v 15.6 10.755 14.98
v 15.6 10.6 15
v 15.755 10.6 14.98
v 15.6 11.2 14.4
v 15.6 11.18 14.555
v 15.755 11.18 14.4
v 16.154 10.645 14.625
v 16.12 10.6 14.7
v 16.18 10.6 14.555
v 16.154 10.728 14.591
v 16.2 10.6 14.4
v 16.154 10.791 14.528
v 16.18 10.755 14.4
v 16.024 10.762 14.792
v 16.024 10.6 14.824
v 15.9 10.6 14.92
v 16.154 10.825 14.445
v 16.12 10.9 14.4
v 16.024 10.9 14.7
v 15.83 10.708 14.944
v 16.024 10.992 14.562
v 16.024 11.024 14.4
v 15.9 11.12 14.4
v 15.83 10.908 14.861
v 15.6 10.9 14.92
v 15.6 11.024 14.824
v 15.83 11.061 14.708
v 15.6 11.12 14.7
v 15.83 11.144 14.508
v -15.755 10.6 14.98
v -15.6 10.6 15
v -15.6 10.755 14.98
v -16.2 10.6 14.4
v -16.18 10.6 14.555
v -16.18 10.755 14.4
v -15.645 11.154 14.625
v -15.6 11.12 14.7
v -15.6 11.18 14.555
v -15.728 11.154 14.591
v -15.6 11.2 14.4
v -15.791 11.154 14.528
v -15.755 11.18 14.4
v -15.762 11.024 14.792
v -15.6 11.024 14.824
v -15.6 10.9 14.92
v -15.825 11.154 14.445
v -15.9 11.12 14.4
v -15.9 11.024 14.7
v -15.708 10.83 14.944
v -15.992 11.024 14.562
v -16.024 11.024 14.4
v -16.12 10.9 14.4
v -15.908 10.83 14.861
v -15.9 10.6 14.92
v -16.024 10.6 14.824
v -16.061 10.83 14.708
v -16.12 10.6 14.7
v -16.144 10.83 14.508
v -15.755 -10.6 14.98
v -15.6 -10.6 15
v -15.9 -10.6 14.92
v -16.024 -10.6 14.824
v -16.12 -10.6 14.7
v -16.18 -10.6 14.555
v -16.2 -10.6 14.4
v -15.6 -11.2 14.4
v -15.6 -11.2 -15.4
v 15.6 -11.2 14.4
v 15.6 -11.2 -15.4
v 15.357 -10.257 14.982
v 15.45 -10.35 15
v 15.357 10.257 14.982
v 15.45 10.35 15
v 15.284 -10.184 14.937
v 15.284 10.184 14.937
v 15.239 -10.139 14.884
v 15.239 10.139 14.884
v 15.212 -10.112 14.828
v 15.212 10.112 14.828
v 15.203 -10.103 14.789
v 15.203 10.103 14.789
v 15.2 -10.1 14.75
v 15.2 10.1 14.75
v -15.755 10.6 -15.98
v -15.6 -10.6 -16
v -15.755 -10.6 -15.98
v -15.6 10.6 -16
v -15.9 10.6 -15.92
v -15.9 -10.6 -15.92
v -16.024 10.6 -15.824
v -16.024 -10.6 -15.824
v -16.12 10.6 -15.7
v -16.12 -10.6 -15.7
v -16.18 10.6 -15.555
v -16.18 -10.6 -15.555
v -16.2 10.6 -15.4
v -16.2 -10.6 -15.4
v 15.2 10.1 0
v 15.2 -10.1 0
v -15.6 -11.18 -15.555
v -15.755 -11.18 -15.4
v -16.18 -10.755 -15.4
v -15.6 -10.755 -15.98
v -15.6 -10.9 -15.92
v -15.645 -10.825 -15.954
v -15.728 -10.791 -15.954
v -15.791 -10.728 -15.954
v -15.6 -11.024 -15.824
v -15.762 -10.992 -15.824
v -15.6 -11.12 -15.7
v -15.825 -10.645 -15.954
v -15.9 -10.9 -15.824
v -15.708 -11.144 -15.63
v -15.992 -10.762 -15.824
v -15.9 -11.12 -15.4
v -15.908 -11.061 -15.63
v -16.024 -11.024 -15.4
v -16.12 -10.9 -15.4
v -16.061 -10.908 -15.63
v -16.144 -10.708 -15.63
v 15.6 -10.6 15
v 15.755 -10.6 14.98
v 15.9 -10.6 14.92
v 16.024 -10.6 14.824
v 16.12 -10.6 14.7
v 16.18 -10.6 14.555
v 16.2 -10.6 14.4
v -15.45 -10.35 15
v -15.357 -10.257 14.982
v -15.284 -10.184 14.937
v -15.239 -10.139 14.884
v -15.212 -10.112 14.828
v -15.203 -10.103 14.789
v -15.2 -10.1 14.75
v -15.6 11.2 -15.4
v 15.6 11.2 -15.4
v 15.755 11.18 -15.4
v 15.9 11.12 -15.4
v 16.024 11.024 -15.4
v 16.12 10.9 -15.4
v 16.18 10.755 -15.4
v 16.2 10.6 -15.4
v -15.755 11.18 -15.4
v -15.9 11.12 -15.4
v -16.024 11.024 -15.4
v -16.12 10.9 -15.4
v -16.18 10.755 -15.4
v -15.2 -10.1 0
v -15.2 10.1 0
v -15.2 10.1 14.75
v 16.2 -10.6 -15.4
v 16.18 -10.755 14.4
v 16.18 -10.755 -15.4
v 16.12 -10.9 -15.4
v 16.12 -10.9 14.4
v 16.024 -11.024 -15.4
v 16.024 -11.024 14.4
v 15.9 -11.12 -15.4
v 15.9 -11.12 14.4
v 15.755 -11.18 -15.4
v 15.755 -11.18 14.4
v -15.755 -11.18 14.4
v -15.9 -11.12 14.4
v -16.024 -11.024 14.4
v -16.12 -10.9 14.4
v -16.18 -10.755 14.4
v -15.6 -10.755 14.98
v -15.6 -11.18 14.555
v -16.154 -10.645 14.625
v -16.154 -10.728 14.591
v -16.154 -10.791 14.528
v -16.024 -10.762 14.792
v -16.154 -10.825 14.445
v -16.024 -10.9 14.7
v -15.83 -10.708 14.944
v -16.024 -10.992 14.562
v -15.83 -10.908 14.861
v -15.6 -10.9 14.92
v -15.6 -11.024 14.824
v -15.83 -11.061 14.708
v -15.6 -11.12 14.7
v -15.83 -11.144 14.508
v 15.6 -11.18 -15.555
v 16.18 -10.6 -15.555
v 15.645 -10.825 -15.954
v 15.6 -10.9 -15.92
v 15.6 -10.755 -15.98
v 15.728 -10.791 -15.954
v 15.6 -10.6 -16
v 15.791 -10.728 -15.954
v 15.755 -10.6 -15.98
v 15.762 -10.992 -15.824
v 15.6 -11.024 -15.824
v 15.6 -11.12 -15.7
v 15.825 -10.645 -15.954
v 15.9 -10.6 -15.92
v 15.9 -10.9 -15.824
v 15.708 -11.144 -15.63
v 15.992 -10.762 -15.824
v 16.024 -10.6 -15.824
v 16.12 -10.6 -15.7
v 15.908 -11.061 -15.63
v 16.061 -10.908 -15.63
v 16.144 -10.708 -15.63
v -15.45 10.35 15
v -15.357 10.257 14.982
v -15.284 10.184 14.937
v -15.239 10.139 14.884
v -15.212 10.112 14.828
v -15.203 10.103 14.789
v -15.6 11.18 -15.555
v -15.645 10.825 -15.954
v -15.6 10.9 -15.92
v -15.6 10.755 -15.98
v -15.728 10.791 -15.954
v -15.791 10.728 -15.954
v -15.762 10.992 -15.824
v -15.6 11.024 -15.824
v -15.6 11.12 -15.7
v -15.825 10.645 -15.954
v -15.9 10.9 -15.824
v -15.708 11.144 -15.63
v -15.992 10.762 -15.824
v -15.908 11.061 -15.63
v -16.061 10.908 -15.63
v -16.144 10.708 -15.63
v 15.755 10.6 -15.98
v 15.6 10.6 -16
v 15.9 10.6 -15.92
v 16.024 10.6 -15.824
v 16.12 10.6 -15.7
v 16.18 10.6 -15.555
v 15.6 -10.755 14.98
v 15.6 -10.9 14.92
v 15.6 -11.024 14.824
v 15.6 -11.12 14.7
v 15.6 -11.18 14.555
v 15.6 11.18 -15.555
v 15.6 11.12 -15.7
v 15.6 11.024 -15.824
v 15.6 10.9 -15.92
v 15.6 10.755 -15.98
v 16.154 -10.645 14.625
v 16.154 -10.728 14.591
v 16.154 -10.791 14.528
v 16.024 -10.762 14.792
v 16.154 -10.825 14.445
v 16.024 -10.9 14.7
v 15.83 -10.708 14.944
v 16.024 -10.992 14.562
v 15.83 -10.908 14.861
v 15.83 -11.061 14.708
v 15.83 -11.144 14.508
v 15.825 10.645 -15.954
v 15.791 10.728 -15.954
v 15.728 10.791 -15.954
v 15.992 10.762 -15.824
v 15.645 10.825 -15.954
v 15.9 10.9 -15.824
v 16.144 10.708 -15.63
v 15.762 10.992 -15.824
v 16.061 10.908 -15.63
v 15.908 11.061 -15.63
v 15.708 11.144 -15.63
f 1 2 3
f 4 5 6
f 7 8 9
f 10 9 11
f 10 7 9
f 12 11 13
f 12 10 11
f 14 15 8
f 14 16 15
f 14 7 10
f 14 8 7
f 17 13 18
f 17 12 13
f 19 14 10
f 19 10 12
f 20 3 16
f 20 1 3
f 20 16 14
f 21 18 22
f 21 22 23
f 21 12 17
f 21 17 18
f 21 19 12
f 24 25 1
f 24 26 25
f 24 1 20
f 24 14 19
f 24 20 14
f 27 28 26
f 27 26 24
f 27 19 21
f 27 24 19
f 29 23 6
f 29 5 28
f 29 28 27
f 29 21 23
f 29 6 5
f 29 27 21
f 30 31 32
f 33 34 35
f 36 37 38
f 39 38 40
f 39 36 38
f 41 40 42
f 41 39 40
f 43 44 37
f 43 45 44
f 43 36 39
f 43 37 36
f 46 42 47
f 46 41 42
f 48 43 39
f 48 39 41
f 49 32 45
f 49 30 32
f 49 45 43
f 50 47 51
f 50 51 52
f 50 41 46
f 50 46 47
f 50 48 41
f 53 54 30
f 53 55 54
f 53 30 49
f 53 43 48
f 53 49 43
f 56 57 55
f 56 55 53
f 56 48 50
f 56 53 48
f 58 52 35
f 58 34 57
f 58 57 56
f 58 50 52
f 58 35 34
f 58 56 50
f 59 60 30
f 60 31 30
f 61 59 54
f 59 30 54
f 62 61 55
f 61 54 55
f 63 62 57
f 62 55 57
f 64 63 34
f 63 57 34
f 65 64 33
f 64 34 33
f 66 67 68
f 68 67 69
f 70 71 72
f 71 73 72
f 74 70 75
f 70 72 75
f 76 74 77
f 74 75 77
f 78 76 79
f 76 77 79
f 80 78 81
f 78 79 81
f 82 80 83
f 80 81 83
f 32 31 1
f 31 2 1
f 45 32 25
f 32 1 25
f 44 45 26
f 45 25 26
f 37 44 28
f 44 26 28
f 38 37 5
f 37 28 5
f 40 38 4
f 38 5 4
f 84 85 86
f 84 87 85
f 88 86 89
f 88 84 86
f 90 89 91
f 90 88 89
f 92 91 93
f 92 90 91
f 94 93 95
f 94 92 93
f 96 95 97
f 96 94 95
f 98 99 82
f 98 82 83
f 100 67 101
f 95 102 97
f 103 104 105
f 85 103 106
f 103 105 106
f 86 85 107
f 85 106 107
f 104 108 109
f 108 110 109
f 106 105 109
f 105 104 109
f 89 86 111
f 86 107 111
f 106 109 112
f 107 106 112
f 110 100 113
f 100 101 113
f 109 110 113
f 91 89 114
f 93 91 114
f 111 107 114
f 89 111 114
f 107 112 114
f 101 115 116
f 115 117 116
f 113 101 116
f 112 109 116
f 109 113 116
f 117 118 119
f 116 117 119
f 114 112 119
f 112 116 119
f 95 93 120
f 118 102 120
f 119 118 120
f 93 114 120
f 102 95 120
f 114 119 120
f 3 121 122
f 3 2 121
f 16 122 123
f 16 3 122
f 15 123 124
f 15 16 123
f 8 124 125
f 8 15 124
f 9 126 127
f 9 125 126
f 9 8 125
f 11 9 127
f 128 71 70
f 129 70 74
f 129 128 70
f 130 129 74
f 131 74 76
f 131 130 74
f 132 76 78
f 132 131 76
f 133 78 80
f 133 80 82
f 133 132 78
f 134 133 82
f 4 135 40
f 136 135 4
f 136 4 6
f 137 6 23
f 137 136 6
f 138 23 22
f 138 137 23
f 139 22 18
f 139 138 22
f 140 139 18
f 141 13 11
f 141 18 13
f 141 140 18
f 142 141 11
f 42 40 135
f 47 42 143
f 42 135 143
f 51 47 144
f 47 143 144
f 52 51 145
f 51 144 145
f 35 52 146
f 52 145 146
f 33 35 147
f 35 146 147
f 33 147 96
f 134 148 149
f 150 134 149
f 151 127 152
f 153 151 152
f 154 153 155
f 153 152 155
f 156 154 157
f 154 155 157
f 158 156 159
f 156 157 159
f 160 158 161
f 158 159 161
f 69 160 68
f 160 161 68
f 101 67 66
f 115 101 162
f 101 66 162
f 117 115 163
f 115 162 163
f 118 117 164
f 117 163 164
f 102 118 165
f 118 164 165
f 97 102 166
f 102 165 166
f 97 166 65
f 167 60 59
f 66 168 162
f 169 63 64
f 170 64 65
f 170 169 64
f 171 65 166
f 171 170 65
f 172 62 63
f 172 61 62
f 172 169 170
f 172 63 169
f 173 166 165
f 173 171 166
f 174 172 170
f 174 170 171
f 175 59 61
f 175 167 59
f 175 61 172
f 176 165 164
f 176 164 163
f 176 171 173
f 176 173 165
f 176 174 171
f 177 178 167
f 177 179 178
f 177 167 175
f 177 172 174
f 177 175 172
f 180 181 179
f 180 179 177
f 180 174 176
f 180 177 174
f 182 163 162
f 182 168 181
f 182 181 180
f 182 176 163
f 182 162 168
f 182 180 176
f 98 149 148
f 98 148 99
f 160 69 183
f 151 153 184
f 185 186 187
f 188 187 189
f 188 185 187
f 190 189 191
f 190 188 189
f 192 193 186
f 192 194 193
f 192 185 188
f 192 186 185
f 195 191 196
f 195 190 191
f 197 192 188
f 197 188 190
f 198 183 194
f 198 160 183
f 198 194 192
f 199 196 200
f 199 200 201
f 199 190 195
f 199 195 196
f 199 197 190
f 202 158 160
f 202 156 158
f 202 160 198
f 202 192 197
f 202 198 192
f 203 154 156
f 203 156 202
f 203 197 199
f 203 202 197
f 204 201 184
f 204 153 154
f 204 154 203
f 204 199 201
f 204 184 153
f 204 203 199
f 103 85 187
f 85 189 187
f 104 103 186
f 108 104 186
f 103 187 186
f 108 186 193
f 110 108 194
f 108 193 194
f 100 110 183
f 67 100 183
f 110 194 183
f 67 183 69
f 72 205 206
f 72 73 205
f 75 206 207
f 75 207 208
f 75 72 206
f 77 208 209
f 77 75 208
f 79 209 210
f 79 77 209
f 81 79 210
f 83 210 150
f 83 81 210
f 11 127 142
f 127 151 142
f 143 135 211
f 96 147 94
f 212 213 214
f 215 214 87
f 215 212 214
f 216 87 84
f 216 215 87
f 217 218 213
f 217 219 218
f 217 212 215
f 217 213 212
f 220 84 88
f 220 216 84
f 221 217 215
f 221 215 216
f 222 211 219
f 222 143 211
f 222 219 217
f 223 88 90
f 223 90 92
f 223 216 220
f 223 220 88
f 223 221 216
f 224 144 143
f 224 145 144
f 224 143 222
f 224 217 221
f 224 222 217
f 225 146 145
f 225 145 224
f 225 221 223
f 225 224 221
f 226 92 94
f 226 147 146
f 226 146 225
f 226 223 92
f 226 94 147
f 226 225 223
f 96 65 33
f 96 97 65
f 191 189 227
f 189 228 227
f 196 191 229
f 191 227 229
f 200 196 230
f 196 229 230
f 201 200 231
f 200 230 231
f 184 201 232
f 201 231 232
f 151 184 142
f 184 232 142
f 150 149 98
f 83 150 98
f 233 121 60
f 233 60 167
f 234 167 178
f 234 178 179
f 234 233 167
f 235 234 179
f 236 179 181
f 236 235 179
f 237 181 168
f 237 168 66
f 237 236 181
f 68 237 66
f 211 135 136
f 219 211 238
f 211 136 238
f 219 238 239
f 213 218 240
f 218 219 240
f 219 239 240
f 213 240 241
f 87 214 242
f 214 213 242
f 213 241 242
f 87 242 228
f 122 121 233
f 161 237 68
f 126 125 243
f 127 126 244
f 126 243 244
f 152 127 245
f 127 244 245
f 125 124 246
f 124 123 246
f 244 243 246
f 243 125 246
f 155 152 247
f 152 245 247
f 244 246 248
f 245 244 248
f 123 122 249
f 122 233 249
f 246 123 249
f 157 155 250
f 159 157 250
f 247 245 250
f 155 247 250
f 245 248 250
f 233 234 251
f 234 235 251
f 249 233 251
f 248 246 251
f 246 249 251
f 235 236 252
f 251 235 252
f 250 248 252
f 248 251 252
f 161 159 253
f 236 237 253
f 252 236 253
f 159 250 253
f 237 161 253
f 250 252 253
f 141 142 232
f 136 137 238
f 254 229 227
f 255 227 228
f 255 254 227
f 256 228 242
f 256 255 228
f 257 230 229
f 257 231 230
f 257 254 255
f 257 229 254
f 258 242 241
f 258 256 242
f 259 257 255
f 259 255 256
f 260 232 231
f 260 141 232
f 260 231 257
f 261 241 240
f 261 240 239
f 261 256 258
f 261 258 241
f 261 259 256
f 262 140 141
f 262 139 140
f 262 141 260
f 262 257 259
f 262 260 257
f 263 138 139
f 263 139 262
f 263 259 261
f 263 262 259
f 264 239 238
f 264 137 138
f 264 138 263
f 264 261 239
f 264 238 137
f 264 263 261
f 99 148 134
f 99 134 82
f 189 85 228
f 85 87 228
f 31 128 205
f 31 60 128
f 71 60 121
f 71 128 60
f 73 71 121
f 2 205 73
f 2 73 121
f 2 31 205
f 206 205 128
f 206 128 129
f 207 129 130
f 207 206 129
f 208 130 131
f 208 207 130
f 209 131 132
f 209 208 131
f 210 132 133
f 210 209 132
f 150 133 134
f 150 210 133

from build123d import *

# Parameters (mm, degrees)
F0_W     = 30.4
F0_H     = 20.2
F1_DEPTH = 16
F0_W_2   = 32.4
F0_H_2   = 22.4
F2_DEPTH = 16
F3_DEPTH = 15
F4_R     = 0.25
F5_R     = 0.25
F6_R     = 0.6


with BuildPart() as f1:
    # F0 (on Top) → F1 (new body)
    with BuildSketch(Plane.XY):
        Rectangle(F0_W, F0_H)
    extrude(amount=-F1_DEPTH)

    # F0 (on Top) → F2 (join)
    with BuildSketch(Plane.XY):
        Rectangle(F0_W_2, F0_H_2)
        Rectangle(F0_W, F0_H, mode=Mode.SUBTRACT)
    extrude(amount=-F2_DEPTH)

    # F0 (on Top) → F3 (join)
    with BuildSketch(Plane.XY):
        Rectangle(F0_W_2, F0_H_2)
        Rectangle(F0_W, F0_H, mode=Mode.SUBTRACT)
    extrude(amount=F3_DEPTH)

    # F4
    f4_edges = [f1.edges().sort_by_distance(p)[0] for p in [
        (-15.2, 0, 15),
    ]]
    fillet(f4_edges, radius=F4_R)

    # F5
    f5_edges = [f1.edges().sort_by_distance(p)[0] for p in [
        (0, 10.1, 15),
        (15.2, 0, 15),
        (0, -10.1, 15),
    ]]
    fillet(f5_edges, radius=F5_R)

    # F6
    f6_edges = [f1.edges().sort_by_distance(p)[0] for p in [
        (0, -11.2, 15),
        (-16.2, 0, 15),
        (0, 11.2, 15),
        (16.2, 0, 15),
        (-16.2, -11.2, -0.5),
        (16.2, -11.2, -0.5),
        (16.2, 11.2, -0.5),
        (-16.2, 11.2, -0.5),
        (0, -11.2, -16),
        (16.2, 0, -16),
        (0, 11.2, -16),
        (-16.2, 0, -16),
    ]]
    fillet(f6_edges, radius=F6_R)


solid = f1.part
